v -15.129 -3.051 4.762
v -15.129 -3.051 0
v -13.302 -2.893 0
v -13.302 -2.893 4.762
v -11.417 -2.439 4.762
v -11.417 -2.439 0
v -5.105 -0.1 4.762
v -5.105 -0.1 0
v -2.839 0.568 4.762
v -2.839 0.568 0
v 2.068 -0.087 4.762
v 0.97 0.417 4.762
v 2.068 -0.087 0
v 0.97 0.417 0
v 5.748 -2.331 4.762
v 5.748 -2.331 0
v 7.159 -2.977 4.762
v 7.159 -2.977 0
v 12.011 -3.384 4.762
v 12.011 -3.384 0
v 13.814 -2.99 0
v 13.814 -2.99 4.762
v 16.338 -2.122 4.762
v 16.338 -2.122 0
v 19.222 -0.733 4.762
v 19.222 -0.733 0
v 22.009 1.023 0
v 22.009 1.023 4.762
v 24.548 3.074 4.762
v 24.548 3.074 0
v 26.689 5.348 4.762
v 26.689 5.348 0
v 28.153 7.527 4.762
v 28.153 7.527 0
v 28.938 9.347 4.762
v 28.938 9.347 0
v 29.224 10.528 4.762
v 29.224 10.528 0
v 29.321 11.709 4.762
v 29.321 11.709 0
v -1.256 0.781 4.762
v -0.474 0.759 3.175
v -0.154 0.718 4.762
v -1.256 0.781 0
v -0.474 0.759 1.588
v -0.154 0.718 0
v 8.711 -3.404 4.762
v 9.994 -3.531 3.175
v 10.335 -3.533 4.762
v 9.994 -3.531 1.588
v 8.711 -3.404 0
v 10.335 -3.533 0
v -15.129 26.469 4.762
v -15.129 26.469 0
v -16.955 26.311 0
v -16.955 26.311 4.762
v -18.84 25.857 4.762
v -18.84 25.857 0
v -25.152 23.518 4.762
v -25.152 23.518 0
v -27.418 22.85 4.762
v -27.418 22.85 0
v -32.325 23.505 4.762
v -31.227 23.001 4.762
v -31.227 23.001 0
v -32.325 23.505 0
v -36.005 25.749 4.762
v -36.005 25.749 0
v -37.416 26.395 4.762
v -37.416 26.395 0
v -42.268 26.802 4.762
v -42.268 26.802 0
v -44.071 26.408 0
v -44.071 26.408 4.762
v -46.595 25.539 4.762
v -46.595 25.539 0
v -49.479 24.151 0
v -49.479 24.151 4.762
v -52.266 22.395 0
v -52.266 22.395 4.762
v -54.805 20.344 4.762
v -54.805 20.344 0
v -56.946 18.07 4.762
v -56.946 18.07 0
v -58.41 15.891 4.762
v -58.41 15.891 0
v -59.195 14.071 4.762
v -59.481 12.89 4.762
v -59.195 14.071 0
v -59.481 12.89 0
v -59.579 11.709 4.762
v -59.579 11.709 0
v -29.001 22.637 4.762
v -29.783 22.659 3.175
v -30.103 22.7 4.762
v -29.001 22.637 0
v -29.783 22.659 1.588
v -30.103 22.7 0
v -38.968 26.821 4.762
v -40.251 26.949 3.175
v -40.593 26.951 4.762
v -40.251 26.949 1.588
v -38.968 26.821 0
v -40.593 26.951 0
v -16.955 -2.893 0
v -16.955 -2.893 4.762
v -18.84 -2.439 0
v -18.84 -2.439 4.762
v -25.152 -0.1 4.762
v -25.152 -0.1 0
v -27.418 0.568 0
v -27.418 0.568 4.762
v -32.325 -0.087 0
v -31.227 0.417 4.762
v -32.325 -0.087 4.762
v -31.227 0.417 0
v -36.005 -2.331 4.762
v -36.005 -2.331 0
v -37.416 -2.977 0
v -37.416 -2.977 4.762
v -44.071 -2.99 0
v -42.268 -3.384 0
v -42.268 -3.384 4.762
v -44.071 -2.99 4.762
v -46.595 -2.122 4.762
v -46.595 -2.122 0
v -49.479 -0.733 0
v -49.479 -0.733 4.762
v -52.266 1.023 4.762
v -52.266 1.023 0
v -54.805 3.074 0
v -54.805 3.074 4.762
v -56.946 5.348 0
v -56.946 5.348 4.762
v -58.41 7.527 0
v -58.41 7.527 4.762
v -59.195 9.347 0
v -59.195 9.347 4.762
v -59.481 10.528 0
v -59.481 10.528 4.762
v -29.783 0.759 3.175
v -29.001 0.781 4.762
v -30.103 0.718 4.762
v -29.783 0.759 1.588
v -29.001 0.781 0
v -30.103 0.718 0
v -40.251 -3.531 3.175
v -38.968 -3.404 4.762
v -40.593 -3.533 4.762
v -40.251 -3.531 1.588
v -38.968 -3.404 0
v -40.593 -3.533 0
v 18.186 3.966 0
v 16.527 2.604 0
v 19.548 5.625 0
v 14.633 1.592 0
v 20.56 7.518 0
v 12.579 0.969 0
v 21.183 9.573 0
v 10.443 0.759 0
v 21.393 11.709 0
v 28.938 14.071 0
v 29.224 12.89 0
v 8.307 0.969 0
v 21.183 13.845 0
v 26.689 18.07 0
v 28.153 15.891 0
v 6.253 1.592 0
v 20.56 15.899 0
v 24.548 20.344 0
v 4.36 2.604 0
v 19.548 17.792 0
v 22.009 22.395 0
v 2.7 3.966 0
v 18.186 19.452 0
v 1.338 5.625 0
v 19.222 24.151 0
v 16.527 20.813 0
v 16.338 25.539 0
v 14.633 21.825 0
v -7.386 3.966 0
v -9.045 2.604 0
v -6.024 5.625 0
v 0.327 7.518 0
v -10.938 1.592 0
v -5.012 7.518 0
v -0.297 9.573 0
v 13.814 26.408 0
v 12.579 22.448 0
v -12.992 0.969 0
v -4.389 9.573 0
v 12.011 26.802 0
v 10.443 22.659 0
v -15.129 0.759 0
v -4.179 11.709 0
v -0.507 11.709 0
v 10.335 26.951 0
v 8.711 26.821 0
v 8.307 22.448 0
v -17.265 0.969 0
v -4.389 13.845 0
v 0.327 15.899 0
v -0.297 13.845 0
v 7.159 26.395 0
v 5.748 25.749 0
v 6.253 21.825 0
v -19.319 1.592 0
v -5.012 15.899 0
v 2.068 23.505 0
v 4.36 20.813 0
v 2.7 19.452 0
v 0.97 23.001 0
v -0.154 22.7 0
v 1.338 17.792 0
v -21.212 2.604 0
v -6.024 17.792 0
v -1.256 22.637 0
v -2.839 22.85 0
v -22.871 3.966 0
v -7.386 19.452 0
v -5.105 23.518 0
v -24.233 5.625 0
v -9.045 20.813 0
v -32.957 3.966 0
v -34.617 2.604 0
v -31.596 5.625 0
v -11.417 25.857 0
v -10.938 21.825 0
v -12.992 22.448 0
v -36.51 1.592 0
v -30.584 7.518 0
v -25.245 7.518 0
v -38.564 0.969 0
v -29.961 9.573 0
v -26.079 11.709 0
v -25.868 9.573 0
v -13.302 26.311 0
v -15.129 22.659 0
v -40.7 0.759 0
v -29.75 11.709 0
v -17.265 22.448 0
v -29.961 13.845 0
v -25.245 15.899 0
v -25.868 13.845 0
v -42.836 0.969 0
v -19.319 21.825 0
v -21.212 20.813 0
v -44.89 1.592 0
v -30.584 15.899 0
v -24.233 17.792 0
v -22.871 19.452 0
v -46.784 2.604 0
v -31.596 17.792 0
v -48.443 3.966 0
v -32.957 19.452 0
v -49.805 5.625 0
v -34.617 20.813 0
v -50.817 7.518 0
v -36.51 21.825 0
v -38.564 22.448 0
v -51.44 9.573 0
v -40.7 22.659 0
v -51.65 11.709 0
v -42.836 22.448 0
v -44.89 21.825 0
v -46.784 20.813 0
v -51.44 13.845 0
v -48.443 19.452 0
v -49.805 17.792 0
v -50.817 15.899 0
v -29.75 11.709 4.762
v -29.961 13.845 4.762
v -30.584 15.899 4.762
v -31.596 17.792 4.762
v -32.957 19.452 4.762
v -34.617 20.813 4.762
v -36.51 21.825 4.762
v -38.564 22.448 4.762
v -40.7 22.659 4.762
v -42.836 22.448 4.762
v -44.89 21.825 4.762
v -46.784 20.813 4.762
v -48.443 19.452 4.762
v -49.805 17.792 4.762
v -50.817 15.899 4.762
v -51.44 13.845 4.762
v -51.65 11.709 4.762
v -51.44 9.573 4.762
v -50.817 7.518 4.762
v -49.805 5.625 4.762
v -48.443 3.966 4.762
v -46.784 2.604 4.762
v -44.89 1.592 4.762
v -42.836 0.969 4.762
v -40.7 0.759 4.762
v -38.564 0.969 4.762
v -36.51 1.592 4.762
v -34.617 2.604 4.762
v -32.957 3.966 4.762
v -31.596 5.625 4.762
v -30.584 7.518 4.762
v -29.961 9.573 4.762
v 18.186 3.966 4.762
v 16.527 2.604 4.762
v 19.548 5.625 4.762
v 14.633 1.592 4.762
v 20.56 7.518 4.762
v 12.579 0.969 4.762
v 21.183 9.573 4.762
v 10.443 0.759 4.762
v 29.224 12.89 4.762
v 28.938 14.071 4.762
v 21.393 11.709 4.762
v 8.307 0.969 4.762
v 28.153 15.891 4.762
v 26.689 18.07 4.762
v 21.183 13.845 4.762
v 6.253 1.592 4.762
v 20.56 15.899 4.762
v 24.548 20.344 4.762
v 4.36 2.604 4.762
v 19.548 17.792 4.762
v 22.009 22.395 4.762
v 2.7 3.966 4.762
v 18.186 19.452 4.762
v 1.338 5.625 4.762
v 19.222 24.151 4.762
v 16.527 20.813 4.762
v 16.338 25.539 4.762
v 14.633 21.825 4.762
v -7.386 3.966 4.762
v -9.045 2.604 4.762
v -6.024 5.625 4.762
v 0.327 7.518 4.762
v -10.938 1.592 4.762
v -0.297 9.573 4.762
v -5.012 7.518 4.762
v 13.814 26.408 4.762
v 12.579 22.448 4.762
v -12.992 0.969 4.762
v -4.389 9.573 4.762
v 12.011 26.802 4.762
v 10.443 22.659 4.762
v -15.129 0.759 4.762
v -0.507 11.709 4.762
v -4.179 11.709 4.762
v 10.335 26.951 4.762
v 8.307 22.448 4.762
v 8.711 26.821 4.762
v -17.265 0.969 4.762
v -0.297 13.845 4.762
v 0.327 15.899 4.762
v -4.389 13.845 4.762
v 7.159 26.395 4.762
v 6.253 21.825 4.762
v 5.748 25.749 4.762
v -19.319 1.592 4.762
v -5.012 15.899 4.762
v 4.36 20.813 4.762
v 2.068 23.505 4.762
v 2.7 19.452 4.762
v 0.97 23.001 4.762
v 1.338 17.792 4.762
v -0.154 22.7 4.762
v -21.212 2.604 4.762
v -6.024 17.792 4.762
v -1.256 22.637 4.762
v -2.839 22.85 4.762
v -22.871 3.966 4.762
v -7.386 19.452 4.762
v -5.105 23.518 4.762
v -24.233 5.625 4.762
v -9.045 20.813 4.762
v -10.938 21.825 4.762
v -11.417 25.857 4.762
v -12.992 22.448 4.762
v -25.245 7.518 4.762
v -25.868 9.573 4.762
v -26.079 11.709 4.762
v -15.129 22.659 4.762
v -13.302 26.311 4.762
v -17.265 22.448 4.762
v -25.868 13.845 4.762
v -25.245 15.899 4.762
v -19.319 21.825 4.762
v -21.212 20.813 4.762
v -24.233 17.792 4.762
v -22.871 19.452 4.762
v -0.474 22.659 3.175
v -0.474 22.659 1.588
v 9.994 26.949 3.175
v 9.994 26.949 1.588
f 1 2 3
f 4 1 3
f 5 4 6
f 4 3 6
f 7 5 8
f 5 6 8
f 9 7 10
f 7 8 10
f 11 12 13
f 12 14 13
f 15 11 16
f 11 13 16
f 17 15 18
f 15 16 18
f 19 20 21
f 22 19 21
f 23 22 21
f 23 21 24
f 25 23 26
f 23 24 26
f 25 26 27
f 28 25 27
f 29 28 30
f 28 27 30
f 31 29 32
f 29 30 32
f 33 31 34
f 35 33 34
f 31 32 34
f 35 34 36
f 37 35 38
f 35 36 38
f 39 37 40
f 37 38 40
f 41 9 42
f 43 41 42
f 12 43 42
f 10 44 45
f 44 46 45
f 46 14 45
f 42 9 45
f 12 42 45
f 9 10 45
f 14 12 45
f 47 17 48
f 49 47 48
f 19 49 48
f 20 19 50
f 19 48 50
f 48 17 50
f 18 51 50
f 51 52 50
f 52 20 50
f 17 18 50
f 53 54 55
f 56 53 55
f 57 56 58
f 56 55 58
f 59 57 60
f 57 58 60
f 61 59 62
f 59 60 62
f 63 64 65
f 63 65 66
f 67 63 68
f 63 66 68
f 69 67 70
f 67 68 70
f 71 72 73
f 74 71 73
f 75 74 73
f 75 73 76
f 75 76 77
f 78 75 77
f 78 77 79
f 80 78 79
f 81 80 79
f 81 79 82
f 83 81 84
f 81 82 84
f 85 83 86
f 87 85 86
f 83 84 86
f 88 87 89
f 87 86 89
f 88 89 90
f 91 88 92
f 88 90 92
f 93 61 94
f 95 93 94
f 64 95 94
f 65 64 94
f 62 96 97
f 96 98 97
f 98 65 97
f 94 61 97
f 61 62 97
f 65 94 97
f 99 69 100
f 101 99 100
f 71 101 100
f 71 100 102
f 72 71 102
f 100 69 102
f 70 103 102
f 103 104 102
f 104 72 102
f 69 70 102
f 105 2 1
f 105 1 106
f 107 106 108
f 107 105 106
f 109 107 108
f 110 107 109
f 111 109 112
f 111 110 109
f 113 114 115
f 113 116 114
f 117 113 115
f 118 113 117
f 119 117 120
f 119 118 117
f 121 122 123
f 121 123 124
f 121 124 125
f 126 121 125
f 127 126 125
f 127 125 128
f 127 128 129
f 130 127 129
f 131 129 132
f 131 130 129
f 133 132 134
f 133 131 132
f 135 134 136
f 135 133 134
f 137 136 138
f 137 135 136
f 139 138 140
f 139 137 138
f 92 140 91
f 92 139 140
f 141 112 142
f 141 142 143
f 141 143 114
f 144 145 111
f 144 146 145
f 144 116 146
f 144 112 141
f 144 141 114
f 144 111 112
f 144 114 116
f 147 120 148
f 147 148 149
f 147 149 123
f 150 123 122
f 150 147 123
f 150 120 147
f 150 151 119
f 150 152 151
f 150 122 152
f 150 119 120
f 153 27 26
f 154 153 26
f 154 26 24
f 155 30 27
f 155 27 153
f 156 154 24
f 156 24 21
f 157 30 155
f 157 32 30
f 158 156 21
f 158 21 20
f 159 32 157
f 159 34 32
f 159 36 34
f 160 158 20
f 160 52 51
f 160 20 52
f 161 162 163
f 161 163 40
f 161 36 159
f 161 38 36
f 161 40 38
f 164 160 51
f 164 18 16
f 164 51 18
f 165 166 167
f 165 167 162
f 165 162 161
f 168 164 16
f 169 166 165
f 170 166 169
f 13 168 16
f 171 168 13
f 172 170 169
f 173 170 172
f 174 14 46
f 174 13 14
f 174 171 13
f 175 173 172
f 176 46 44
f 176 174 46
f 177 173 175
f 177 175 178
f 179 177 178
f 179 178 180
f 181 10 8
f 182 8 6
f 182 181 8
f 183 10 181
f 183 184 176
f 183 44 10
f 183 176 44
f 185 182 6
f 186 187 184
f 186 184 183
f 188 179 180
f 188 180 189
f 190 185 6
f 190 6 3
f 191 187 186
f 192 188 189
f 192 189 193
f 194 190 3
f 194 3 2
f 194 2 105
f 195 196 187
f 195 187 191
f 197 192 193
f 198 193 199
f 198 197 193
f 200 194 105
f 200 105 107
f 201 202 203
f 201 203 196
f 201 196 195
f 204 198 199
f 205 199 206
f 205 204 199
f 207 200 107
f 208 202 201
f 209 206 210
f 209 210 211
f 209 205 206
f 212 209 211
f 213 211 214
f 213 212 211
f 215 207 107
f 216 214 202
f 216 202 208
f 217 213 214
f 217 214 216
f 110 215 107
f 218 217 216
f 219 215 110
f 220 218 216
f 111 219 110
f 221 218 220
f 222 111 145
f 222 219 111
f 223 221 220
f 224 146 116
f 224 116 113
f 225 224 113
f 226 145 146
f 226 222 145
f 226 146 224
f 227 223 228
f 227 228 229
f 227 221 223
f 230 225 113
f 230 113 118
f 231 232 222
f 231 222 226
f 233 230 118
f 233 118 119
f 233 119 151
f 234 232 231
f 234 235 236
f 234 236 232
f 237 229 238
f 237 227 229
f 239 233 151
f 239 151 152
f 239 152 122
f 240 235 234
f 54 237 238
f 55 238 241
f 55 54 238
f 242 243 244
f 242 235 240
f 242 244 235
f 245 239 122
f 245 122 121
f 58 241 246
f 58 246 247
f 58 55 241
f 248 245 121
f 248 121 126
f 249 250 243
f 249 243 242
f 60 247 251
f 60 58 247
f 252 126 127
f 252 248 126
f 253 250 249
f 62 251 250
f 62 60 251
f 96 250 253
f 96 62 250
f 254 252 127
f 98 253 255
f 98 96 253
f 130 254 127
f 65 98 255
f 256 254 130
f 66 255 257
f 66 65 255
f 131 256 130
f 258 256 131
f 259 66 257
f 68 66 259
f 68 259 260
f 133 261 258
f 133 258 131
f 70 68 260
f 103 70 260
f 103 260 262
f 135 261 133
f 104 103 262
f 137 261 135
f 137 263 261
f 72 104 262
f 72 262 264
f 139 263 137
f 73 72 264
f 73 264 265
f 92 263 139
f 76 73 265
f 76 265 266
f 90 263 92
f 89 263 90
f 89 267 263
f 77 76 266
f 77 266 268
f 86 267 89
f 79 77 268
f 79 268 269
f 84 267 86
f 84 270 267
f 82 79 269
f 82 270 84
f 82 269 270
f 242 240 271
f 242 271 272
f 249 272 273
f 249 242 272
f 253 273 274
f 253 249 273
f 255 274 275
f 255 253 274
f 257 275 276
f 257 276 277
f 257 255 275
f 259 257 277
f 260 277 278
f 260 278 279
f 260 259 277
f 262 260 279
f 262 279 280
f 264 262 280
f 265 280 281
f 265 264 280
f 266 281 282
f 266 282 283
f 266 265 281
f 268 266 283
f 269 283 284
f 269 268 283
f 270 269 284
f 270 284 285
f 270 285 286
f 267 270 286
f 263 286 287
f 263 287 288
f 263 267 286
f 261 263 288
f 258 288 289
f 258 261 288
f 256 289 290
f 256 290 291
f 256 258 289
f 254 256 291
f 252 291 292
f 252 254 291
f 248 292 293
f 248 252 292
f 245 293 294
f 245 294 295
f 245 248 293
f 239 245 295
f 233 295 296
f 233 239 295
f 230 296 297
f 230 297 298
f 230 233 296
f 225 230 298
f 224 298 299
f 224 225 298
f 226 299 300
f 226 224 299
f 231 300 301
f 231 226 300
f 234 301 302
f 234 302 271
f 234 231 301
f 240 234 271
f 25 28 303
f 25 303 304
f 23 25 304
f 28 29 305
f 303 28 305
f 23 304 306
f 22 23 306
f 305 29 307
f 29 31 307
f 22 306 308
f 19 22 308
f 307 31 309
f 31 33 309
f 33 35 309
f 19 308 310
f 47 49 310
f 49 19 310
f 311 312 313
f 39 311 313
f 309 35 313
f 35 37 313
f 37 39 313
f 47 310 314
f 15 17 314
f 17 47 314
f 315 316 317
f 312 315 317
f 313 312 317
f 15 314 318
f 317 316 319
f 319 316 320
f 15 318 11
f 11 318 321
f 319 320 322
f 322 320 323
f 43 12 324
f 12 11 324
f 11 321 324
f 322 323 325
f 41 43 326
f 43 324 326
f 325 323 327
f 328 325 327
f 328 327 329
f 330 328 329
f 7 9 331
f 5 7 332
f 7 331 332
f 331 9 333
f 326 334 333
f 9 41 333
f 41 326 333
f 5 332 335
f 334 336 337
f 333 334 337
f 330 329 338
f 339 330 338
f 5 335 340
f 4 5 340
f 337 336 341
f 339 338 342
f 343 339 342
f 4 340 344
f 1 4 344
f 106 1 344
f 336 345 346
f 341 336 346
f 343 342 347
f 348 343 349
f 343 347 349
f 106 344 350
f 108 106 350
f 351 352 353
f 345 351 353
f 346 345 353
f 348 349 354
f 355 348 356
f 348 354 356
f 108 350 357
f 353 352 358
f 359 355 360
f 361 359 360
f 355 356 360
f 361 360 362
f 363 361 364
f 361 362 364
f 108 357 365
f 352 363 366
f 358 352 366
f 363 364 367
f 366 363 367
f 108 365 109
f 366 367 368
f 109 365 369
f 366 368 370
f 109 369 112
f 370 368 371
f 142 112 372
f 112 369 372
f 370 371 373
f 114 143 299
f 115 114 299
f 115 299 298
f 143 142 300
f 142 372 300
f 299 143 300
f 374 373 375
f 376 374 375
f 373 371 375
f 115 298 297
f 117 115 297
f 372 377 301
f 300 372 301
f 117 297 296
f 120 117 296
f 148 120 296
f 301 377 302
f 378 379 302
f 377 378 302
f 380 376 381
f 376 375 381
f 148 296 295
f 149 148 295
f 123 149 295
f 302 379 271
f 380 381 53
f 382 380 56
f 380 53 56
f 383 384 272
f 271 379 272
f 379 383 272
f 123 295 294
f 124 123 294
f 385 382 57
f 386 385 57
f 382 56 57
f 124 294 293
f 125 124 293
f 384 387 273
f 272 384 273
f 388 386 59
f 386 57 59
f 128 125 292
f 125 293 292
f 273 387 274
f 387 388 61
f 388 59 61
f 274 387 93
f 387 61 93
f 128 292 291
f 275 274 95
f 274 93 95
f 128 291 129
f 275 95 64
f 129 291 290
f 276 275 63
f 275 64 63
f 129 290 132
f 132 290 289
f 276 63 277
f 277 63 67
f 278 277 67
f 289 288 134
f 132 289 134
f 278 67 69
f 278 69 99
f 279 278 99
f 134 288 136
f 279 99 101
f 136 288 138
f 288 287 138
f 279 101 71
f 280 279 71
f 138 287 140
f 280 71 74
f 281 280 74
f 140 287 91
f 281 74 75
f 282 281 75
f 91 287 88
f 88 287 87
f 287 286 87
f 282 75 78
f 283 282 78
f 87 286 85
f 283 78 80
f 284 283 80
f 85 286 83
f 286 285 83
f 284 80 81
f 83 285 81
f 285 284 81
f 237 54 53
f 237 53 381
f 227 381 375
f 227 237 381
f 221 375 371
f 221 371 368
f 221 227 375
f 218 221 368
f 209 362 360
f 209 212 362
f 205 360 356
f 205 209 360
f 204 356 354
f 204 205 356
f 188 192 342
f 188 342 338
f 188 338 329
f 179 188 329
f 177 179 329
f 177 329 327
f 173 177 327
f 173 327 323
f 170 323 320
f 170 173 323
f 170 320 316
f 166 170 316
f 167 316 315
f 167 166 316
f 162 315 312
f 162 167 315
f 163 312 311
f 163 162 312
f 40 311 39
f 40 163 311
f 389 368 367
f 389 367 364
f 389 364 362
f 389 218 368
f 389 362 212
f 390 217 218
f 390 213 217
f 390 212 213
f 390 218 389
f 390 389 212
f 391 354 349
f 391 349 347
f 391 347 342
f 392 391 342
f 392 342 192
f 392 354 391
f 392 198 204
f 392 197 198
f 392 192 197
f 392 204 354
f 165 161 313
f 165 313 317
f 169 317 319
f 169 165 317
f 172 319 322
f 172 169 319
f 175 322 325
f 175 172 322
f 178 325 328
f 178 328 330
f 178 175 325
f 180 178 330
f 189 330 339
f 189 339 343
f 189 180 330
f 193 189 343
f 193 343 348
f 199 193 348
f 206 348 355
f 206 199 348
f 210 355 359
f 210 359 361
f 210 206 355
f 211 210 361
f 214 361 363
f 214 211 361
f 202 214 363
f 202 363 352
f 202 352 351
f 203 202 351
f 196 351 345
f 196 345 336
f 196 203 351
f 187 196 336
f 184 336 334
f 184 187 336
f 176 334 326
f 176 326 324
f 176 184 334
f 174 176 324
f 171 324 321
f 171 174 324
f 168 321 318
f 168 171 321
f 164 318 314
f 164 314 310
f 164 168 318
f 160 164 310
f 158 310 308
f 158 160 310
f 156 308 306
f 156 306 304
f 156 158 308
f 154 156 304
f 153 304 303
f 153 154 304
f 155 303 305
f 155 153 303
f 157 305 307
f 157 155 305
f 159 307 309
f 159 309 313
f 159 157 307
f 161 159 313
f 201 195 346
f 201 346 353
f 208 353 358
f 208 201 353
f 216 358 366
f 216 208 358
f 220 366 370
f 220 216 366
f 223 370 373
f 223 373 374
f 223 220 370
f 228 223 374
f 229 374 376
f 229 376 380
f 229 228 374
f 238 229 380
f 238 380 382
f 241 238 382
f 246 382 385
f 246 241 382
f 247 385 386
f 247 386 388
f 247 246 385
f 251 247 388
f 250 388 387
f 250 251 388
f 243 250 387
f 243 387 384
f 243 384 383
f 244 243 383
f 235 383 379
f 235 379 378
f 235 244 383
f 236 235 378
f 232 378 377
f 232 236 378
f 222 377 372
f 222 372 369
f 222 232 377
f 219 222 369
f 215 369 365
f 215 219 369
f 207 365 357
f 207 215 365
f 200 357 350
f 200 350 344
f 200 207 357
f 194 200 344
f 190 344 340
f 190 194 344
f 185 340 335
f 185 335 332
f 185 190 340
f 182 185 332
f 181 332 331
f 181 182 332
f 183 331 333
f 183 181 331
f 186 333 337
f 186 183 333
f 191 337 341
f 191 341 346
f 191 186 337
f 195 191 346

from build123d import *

# Parameters (mm, degrees)
F0_R     = 10.95
F1_DEPTH = 4.7625


with BuildPart() as f1:
    # F0 (on Top) → F1 (new body)
    with BuildSketch(Plane.XY):
        with BuildLine():
            add(Edge.make_bspline(
                [(-15.1285366372, 26.4688785569), (-10.3162465445, 26.5345924993), (0.4552537202, 18.5688464564), (8.5664581075, 32.4858505018), (29.3376688198, 19.2019392716), (29.3214633628, 11.7088785569)],
                knots=[0, 0, 0, 0, 0.3185350392, 0.5938778395, 1, 1, 1, 1], degree=3))
            add(Edge.make_bspline(
                [(-15.1285366372, 26.4688785569), (-19.94082673, 26.5345924993), (-30.7123269946, 18.5688464564), (-38.823531382, 32.4858505018), (-59.5947420943, 19.2019392716), (-59.5785366372, 11.7088785569)],
                knots=[0, 0, 0, 0, 0.3185350392, 0.5938778395, 1, 1, 1, 1], degree=3))
            add(Edge.make_bspline(
                [(-15.1285366372, -3.0511214431), (-19.94082673, -3.1168353855), (-30.7123269946, 4.8489106573), (-38.823531382, -9.0680933881), (-59.5947420943, 4.2158178421), (-59.5785366372, 11.7088785569)],
                knots=[0, 0, 0, 0, 0.3185350392, 0.5938778395, 1, 1, 1, 1], degree=3))
            add(Edge.make_bspline(
                [(-15.1285366372, -3.0511214431), (-10.3162465445, -3.1168353855), (0.4552537202, 4.8489106573), (8.5664581075, -9.0680933881), (29.3376688198, 4.2158178421), (29.3214633628, 11.7088785569)],
                knots=[0, 0, 0, 0, 0.3185350392, 0.5938778395, 1, 1, 1, 1], degree=3))
        make_face()
        with Locations((-40.7001013013, 11.7088785569)):
            Circle(F0_R, mode=Mode.SUBTRACT)
        with Locations((-15.1285366372, 11.7088785569)):
            Circle(F0_R, mode=Mode.SUBTRACT)
        with Locations((10.4430280269, 11.7088785569)):
            Circle(F0_R, mode=Mode.SUBTRACT)
    extrude(amount=F1_DEPTH)


solid = f1.part
